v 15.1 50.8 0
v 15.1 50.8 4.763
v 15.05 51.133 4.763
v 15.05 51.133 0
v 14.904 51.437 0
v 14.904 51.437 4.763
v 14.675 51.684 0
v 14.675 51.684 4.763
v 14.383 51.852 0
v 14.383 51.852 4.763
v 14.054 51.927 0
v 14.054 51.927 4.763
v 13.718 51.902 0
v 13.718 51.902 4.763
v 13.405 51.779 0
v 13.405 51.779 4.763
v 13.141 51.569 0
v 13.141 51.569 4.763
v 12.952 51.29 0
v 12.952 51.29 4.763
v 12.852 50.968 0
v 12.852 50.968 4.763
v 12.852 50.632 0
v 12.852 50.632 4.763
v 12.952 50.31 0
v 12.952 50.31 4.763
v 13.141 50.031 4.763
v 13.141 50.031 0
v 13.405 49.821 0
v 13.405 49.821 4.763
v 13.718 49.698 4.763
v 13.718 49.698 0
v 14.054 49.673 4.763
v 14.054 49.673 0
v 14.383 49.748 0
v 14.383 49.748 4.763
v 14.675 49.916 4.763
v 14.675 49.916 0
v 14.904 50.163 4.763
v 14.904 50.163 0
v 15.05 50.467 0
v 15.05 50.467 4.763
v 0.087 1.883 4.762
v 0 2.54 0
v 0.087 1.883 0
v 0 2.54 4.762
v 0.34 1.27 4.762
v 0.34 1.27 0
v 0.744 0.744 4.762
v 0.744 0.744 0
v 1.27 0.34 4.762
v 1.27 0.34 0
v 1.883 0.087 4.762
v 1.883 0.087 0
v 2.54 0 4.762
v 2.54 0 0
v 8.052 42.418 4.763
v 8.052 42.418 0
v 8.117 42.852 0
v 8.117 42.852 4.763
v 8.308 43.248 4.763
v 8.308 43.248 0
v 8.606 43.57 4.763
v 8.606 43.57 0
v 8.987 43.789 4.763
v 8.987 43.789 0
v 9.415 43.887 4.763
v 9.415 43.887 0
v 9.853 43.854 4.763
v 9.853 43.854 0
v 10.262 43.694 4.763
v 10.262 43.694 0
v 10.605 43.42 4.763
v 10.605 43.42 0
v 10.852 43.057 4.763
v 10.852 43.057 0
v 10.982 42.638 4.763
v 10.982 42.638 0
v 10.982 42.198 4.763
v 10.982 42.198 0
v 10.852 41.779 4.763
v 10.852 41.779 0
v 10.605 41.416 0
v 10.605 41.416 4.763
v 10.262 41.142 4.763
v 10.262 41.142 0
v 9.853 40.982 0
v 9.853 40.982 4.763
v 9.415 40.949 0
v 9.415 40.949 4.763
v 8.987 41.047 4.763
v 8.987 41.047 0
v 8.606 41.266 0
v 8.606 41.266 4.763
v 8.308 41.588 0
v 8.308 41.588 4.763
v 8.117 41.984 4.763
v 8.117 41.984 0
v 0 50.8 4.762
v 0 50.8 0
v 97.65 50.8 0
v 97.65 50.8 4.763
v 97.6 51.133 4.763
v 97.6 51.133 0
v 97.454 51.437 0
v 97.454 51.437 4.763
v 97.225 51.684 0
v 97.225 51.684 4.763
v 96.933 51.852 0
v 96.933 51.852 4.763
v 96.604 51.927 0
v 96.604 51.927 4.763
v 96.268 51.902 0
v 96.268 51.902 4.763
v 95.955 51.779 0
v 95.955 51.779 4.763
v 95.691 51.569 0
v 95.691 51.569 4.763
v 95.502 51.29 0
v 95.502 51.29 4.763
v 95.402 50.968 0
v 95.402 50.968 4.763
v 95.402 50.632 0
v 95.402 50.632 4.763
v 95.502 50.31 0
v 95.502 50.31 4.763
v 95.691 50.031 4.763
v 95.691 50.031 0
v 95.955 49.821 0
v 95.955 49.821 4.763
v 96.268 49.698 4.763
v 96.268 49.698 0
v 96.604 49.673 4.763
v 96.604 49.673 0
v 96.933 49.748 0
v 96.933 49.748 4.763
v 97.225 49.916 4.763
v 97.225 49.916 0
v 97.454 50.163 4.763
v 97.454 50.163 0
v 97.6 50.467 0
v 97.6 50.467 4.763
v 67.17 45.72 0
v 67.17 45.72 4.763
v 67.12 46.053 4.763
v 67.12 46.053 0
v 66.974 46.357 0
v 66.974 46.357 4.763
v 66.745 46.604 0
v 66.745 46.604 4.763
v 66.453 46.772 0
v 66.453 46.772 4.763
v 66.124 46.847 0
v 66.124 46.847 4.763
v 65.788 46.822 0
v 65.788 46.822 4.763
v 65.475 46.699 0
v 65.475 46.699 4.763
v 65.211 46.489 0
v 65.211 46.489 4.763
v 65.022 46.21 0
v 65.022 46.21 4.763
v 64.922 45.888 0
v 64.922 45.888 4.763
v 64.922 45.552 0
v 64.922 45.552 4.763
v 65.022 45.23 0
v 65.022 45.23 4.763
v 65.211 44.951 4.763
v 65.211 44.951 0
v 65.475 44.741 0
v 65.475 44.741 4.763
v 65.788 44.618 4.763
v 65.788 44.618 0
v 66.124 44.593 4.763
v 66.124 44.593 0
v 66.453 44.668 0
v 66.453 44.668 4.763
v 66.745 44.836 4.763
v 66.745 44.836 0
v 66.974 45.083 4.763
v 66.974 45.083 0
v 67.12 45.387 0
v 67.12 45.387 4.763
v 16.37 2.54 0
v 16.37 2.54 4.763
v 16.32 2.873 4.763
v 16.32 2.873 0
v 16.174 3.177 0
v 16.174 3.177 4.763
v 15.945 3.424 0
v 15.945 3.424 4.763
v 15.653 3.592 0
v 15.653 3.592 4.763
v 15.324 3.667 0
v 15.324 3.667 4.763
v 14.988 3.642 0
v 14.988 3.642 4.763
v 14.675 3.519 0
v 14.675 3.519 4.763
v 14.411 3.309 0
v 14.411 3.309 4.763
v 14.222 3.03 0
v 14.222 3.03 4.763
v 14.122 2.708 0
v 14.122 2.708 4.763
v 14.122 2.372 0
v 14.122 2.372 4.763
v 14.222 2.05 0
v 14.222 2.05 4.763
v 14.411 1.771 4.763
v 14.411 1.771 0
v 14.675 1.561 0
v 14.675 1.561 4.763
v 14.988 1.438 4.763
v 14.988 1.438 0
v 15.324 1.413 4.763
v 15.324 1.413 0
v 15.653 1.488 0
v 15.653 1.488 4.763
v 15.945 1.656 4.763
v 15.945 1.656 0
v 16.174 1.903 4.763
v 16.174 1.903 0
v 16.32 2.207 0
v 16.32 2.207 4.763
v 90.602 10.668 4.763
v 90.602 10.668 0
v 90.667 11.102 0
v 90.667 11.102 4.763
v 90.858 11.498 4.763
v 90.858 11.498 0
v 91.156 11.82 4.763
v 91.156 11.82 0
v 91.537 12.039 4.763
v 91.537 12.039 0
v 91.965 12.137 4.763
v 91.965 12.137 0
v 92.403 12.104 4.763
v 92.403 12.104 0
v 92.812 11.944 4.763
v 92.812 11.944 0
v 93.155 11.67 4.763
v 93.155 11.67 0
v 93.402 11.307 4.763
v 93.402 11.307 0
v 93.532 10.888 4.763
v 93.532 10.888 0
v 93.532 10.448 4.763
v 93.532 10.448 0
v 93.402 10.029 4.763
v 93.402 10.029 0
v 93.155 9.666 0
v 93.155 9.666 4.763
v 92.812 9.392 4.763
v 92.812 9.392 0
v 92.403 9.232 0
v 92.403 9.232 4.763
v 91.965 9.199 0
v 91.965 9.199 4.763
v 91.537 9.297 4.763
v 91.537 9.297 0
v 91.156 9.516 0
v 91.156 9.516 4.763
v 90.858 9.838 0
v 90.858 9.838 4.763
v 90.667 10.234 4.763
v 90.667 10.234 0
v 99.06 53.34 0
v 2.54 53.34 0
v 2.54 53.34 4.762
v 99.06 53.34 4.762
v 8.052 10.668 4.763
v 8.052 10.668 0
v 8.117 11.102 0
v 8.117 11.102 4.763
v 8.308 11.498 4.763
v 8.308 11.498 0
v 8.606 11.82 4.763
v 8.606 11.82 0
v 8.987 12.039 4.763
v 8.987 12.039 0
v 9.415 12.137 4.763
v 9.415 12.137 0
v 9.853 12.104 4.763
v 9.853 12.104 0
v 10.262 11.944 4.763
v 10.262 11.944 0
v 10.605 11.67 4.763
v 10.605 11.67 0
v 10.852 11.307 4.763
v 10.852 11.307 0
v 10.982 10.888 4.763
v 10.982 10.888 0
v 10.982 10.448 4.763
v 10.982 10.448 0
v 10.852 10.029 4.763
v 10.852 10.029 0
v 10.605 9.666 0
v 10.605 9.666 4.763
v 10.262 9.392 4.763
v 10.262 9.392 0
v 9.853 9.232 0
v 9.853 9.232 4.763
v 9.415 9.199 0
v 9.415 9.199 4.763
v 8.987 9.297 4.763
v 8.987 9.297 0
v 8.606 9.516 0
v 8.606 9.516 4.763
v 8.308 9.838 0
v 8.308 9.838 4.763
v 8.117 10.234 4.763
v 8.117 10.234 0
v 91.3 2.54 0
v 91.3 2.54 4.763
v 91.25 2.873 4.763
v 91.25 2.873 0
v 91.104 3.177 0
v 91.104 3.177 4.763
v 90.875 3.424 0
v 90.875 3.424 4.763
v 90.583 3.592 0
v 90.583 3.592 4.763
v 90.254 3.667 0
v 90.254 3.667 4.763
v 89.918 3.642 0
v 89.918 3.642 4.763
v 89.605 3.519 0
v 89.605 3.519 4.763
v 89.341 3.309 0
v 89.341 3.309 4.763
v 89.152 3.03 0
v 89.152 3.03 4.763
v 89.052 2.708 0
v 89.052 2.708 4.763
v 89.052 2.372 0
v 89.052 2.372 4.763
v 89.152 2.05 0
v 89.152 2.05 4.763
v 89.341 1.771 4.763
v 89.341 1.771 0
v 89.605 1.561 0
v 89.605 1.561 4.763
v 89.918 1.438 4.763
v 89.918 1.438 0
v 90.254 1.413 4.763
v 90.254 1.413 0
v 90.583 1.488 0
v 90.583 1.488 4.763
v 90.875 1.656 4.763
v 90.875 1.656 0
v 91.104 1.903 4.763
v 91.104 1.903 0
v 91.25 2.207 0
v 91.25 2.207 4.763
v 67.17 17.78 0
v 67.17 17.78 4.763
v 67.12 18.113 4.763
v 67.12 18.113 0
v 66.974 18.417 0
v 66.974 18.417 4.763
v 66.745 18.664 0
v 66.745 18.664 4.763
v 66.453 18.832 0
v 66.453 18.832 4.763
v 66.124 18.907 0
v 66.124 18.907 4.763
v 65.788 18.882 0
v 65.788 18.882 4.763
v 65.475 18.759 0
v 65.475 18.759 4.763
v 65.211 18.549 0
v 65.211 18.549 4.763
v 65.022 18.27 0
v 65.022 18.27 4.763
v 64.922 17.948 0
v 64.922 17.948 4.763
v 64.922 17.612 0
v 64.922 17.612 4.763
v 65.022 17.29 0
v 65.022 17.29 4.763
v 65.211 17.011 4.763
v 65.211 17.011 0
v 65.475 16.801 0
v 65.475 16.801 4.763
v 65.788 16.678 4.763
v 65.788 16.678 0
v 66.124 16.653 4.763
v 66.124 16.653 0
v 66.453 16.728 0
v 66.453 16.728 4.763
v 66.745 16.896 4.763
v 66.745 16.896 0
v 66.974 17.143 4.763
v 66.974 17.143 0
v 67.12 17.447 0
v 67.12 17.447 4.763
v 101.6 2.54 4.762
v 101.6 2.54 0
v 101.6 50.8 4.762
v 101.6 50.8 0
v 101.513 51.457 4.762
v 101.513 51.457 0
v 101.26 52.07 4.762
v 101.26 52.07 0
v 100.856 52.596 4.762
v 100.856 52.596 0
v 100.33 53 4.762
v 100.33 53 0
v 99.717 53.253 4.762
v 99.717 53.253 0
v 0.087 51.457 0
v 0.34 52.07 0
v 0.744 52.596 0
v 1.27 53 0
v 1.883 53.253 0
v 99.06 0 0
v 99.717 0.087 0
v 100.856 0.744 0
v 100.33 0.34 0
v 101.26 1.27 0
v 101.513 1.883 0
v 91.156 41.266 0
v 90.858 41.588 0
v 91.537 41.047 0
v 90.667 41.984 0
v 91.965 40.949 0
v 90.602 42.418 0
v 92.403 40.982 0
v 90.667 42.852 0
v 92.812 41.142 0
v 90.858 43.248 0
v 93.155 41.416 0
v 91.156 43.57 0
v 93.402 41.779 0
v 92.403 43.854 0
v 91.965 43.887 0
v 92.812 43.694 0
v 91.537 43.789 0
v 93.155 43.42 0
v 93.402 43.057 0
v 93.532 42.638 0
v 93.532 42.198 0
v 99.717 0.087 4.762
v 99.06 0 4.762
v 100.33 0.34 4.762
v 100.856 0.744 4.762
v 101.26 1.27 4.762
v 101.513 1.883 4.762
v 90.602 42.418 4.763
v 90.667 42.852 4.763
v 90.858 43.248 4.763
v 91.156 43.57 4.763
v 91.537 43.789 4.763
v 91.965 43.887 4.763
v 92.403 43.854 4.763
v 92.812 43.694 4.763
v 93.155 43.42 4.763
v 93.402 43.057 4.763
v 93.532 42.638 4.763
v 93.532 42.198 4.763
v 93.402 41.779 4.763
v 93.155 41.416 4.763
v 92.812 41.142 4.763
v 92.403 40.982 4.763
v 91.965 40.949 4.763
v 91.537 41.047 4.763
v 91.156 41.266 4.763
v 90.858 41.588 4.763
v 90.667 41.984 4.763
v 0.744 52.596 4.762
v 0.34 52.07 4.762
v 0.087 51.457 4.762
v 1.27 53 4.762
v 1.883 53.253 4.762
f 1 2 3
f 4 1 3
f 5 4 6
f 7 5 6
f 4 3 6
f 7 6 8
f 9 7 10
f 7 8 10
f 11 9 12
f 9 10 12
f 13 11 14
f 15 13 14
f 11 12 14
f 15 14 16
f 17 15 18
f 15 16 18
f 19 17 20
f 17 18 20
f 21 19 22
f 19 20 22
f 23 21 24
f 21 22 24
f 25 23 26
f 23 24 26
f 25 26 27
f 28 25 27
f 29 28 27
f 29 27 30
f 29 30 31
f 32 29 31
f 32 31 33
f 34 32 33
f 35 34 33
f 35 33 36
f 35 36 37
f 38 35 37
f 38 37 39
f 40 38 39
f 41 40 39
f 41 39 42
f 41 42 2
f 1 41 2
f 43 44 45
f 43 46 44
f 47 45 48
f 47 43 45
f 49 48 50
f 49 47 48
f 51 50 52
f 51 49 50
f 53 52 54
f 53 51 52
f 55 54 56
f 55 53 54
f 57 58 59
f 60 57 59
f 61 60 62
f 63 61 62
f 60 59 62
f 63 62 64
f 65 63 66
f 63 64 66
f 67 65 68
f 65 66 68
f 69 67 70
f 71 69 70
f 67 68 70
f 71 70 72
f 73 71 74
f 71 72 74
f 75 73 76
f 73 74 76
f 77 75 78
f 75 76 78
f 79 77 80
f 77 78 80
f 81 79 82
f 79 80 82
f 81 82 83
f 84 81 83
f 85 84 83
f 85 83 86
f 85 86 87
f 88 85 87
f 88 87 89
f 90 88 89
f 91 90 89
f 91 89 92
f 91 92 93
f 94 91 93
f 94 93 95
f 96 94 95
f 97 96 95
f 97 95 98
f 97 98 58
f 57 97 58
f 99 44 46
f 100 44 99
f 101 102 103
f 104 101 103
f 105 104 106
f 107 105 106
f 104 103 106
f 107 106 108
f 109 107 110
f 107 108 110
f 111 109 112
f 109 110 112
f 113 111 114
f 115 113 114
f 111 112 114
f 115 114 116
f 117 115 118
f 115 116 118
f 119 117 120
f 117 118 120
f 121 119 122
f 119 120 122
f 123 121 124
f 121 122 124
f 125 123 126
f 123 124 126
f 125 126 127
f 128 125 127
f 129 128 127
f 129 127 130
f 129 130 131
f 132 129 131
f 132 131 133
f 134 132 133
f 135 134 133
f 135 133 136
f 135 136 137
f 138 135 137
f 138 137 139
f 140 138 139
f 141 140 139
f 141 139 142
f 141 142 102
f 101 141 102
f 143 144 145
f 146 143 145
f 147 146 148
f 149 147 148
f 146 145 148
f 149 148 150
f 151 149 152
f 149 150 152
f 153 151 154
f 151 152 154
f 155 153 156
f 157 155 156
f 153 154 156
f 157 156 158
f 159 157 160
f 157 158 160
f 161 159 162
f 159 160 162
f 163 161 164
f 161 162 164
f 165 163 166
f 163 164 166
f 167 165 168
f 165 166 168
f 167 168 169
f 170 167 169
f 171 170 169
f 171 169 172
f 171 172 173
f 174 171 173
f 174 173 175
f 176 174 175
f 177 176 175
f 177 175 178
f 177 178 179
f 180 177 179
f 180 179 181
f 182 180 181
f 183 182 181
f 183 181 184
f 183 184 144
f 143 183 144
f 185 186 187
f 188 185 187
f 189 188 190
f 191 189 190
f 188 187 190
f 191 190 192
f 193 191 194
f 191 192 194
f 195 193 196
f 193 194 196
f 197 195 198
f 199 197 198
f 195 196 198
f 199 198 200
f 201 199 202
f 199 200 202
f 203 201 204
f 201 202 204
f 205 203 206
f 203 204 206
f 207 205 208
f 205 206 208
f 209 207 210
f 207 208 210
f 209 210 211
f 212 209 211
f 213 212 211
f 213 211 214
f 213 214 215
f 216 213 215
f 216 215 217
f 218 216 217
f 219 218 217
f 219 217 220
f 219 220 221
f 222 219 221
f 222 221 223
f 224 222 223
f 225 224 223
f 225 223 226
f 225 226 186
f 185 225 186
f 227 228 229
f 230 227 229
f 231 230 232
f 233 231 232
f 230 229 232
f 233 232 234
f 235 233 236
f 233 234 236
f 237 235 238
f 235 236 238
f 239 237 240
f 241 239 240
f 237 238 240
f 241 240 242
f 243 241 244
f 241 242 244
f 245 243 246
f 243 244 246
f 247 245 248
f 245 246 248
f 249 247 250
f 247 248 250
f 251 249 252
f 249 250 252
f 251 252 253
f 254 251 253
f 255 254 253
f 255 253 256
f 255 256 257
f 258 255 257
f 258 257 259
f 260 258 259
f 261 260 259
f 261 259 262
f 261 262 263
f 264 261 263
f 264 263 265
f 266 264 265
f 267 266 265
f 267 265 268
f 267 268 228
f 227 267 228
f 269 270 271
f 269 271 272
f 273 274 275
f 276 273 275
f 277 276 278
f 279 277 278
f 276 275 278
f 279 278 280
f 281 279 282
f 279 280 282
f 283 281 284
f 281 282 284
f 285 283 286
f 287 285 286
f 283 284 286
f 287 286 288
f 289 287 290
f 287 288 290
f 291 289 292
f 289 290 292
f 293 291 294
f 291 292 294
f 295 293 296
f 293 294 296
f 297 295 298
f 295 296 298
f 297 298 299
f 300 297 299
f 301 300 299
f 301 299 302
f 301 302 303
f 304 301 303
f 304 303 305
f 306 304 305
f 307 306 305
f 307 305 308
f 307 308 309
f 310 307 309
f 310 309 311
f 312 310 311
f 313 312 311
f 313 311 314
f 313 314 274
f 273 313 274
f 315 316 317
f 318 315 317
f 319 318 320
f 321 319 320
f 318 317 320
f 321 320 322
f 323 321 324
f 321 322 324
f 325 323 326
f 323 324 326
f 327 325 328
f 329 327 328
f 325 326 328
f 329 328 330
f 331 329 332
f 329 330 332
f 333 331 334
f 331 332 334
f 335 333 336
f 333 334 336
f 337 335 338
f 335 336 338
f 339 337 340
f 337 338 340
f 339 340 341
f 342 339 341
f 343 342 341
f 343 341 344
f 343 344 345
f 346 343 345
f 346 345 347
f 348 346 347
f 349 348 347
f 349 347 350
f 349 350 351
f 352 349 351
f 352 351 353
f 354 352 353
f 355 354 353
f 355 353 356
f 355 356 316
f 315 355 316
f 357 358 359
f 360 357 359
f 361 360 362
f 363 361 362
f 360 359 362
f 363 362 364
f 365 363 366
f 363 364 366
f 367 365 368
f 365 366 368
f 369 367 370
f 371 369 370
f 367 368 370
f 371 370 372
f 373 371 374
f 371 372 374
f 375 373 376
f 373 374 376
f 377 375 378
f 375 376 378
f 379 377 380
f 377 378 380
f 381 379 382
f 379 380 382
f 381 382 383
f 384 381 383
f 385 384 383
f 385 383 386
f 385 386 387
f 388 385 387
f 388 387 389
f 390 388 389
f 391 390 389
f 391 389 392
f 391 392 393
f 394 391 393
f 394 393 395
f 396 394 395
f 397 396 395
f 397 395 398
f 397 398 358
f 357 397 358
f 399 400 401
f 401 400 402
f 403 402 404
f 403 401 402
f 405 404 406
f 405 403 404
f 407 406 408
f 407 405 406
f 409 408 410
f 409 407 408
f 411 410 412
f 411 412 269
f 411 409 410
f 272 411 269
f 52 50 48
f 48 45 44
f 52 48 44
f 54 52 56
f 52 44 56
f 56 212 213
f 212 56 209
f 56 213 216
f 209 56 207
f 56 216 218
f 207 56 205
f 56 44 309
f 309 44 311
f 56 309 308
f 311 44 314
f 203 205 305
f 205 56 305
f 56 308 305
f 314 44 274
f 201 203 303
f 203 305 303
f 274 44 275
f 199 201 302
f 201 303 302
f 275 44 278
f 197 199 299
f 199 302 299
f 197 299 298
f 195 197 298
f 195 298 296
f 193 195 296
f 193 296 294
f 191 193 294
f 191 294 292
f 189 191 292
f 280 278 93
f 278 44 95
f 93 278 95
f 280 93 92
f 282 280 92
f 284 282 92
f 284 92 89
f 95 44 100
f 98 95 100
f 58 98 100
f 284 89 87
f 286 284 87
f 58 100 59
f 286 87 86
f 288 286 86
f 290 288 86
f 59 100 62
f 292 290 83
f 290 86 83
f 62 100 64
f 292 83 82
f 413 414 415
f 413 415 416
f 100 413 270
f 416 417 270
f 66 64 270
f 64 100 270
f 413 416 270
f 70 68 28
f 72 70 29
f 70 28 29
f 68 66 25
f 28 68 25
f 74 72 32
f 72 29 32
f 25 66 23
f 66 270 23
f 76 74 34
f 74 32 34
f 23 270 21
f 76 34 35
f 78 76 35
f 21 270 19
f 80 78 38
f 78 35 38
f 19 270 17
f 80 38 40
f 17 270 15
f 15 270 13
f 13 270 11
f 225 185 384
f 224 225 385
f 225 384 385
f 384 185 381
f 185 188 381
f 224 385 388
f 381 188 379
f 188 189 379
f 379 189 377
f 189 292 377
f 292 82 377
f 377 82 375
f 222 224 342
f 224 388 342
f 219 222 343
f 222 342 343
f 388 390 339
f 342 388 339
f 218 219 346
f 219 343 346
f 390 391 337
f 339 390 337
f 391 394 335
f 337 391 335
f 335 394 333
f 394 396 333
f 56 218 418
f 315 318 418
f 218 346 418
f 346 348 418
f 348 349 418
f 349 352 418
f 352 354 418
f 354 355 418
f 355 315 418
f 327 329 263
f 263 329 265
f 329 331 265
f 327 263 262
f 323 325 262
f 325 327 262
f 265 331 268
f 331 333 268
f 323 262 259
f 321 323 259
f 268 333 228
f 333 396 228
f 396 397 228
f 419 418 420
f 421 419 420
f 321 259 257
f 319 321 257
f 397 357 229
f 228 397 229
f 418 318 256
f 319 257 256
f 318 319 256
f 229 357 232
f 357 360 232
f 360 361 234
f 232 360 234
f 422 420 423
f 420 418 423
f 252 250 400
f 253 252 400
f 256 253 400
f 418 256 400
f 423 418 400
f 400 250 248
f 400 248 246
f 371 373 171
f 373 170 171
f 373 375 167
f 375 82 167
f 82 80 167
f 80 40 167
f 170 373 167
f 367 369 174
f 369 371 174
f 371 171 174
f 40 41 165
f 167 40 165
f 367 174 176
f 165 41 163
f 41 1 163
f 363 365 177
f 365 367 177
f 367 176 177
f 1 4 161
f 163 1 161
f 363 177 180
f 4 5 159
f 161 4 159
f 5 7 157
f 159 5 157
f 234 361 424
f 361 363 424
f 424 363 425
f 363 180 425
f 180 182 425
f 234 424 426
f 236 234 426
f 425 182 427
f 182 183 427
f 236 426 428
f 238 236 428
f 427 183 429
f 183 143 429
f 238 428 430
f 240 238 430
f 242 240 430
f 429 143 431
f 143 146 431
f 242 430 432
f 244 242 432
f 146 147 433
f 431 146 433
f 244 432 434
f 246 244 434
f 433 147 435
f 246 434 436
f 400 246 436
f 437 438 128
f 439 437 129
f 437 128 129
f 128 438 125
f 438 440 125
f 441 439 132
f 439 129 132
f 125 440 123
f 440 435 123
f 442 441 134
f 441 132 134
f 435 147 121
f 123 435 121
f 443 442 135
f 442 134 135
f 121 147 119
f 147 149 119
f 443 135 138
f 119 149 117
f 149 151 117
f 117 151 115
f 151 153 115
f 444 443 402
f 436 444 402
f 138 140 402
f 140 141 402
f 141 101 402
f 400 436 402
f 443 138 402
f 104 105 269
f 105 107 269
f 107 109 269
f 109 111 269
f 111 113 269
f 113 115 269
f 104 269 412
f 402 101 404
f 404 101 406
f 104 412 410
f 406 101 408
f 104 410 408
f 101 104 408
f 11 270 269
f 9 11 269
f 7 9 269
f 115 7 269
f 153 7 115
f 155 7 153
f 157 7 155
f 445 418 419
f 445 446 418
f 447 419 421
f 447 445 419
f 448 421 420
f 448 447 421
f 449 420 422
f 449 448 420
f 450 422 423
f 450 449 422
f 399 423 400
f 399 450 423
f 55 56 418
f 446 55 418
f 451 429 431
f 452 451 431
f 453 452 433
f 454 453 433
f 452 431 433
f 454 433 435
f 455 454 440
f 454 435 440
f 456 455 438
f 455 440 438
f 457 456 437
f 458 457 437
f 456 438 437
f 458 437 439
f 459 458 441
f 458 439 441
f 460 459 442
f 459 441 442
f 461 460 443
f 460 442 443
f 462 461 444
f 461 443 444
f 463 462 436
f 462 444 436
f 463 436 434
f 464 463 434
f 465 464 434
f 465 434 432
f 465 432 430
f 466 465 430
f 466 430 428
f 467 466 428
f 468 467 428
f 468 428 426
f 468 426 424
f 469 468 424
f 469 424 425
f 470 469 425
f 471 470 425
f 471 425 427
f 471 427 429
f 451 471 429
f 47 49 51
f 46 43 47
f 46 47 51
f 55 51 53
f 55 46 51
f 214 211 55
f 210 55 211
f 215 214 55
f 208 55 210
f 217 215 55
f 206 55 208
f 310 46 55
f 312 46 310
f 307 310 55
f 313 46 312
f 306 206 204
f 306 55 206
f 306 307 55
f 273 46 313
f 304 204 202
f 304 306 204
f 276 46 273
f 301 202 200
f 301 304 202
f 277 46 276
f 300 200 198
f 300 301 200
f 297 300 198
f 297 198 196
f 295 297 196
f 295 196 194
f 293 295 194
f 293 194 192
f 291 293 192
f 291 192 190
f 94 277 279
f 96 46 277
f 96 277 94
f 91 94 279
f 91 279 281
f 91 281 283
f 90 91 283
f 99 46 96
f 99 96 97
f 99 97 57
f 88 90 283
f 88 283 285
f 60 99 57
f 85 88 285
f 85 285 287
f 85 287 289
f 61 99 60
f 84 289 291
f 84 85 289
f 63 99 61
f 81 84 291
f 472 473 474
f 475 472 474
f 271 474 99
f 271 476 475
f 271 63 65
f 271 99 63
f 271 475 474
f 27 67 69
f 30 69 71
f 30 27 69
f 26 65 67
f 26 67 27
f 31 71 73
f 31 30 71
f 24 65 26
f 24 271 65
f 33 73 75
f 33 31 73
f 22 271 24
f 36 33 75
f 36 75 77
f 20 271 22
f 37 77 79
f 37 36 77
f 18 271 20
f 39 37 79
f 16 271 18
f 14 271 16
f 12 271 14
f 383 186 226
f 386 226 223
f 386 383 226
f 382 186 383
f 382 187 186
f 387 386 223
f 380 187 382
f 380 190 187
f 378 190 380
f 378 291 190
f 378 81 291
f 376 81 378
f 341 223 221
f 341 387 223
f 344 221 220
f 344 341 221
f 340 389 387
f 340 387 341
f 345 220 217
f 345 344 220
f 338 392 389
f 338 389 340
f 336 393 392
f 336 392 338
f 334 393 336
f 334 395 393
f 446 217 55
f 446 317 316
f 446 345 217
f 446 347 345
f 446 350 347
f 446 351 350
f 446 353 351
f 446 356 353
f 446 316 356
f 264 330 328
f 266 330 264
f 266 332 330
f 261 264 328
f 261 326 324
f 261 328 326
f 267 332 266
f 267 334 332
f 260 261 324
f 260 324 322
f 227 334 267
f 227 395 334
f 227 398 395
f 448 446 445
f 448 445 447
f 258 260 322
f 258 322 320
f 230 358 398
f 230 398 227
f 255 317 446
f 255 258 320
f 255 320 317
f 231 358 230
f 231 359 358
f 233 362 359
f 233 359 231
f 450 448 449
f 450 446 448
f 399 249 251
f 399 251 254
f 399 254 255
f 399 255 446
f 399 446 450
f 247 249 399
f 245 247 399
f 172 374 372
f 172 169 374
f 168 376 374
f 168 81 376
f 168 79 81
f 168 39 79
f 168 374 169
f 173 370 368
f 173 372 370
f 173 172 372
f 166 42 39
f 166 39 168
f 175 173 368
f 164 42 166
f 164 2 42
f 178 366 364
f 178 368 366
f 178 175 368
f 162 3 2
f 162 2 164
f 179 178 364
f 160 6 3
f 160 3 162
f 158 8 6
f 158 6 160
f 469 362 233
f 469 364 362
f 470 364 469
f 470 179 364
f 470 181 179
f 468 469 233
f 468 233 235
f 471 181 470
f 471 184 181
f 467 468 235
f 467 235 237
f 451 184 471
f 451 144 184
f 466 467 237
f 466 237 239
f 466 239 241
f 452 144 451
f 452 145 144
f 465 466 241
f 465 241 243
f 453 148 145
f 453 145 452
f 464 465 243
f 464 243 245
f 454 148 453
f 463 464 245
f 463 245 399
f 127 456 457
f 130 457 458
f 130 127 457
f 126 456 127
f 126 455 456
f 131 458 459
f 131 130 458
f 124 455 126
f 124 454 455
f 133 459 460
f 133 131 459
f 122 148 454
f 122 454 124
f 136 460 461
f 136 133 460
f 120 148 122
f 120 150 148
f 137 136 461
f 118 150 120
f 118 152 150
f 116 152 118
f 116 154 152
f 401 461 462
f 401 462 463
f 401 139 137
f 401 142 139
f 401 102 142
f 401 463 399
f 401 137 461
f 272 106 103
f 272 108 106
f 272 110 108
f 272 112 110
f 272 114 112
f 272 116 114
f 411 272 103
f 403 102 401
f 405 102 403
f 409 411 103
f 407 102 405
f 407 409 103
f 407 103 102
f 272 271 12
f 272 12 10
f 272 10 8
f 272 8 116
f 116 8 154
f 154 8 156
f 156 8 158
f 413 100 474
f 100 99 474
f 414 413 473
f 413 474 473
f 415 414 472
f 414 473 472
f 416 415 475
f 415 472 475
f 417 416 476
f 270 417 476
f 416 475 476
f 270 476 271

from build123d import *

# Parameters (mm, degrees)
SKETCH1_W                 = 101.6
SKETCH1_H                 = 53.34
BOSS_EXTRUDE1_DEPTH       = 4.7625
FILLET1_R                 = 2.54
TAP_DRILL_FOR_4_40_TAP1_D = 2.2606
F_4_CLEARANCE_HOLE2_D     = 2.9464


with BuildPart() as part:
    # Sketch1 → Boss-Extrude1 (new body)
    with BuildSketch(Plane.XY):
        with Locations((50.8, 26.67)):
            Rectangle(SKETCH1_W, SKETCH1_H)
    extrude(amount=BOSS_EXTRUDE1_DEPTH)

    # Fillet1
    fillet1_edges = [part.edges().sort_by_distance(p)[0] for p in [
        (0, 53.34, 2.38125),
        (101.6, 53.34, 2.38125),
        (101.6, 0, 2.38125),
        (0, 0, 2.38125),
    ]]
    fillet(fillet1_edges, radius=FILLET1_R)

    # Tap Drill for #4-40 Tap1 (through all)
    with Locations(Plane(origin=(0, 0, 0), x_dir=(-1, 0, 0), z_dir=(0, 0, -1))):
        with Locations((-15.24, 2.54), (-90.17, 2.54), (-96.52, 50.8), (-66.04, 17.78), (-66.04, 45.72), (-13.97, 50.8)):
            Hole(TAP_DRILL_FOR_4_40_TAP1_D / 2)

    # #4 Clearance Hole2 (through all)
    with Locations(Plane.XY.offset(4.7625)):
        with Locations((9.525, 42.418), (9.525, 10.668), (92.075, 42.418), (92.075, 10.668)):
            Hole(F_4_CLEARANCE_HOLE2_D / 2)


solid = part.part
